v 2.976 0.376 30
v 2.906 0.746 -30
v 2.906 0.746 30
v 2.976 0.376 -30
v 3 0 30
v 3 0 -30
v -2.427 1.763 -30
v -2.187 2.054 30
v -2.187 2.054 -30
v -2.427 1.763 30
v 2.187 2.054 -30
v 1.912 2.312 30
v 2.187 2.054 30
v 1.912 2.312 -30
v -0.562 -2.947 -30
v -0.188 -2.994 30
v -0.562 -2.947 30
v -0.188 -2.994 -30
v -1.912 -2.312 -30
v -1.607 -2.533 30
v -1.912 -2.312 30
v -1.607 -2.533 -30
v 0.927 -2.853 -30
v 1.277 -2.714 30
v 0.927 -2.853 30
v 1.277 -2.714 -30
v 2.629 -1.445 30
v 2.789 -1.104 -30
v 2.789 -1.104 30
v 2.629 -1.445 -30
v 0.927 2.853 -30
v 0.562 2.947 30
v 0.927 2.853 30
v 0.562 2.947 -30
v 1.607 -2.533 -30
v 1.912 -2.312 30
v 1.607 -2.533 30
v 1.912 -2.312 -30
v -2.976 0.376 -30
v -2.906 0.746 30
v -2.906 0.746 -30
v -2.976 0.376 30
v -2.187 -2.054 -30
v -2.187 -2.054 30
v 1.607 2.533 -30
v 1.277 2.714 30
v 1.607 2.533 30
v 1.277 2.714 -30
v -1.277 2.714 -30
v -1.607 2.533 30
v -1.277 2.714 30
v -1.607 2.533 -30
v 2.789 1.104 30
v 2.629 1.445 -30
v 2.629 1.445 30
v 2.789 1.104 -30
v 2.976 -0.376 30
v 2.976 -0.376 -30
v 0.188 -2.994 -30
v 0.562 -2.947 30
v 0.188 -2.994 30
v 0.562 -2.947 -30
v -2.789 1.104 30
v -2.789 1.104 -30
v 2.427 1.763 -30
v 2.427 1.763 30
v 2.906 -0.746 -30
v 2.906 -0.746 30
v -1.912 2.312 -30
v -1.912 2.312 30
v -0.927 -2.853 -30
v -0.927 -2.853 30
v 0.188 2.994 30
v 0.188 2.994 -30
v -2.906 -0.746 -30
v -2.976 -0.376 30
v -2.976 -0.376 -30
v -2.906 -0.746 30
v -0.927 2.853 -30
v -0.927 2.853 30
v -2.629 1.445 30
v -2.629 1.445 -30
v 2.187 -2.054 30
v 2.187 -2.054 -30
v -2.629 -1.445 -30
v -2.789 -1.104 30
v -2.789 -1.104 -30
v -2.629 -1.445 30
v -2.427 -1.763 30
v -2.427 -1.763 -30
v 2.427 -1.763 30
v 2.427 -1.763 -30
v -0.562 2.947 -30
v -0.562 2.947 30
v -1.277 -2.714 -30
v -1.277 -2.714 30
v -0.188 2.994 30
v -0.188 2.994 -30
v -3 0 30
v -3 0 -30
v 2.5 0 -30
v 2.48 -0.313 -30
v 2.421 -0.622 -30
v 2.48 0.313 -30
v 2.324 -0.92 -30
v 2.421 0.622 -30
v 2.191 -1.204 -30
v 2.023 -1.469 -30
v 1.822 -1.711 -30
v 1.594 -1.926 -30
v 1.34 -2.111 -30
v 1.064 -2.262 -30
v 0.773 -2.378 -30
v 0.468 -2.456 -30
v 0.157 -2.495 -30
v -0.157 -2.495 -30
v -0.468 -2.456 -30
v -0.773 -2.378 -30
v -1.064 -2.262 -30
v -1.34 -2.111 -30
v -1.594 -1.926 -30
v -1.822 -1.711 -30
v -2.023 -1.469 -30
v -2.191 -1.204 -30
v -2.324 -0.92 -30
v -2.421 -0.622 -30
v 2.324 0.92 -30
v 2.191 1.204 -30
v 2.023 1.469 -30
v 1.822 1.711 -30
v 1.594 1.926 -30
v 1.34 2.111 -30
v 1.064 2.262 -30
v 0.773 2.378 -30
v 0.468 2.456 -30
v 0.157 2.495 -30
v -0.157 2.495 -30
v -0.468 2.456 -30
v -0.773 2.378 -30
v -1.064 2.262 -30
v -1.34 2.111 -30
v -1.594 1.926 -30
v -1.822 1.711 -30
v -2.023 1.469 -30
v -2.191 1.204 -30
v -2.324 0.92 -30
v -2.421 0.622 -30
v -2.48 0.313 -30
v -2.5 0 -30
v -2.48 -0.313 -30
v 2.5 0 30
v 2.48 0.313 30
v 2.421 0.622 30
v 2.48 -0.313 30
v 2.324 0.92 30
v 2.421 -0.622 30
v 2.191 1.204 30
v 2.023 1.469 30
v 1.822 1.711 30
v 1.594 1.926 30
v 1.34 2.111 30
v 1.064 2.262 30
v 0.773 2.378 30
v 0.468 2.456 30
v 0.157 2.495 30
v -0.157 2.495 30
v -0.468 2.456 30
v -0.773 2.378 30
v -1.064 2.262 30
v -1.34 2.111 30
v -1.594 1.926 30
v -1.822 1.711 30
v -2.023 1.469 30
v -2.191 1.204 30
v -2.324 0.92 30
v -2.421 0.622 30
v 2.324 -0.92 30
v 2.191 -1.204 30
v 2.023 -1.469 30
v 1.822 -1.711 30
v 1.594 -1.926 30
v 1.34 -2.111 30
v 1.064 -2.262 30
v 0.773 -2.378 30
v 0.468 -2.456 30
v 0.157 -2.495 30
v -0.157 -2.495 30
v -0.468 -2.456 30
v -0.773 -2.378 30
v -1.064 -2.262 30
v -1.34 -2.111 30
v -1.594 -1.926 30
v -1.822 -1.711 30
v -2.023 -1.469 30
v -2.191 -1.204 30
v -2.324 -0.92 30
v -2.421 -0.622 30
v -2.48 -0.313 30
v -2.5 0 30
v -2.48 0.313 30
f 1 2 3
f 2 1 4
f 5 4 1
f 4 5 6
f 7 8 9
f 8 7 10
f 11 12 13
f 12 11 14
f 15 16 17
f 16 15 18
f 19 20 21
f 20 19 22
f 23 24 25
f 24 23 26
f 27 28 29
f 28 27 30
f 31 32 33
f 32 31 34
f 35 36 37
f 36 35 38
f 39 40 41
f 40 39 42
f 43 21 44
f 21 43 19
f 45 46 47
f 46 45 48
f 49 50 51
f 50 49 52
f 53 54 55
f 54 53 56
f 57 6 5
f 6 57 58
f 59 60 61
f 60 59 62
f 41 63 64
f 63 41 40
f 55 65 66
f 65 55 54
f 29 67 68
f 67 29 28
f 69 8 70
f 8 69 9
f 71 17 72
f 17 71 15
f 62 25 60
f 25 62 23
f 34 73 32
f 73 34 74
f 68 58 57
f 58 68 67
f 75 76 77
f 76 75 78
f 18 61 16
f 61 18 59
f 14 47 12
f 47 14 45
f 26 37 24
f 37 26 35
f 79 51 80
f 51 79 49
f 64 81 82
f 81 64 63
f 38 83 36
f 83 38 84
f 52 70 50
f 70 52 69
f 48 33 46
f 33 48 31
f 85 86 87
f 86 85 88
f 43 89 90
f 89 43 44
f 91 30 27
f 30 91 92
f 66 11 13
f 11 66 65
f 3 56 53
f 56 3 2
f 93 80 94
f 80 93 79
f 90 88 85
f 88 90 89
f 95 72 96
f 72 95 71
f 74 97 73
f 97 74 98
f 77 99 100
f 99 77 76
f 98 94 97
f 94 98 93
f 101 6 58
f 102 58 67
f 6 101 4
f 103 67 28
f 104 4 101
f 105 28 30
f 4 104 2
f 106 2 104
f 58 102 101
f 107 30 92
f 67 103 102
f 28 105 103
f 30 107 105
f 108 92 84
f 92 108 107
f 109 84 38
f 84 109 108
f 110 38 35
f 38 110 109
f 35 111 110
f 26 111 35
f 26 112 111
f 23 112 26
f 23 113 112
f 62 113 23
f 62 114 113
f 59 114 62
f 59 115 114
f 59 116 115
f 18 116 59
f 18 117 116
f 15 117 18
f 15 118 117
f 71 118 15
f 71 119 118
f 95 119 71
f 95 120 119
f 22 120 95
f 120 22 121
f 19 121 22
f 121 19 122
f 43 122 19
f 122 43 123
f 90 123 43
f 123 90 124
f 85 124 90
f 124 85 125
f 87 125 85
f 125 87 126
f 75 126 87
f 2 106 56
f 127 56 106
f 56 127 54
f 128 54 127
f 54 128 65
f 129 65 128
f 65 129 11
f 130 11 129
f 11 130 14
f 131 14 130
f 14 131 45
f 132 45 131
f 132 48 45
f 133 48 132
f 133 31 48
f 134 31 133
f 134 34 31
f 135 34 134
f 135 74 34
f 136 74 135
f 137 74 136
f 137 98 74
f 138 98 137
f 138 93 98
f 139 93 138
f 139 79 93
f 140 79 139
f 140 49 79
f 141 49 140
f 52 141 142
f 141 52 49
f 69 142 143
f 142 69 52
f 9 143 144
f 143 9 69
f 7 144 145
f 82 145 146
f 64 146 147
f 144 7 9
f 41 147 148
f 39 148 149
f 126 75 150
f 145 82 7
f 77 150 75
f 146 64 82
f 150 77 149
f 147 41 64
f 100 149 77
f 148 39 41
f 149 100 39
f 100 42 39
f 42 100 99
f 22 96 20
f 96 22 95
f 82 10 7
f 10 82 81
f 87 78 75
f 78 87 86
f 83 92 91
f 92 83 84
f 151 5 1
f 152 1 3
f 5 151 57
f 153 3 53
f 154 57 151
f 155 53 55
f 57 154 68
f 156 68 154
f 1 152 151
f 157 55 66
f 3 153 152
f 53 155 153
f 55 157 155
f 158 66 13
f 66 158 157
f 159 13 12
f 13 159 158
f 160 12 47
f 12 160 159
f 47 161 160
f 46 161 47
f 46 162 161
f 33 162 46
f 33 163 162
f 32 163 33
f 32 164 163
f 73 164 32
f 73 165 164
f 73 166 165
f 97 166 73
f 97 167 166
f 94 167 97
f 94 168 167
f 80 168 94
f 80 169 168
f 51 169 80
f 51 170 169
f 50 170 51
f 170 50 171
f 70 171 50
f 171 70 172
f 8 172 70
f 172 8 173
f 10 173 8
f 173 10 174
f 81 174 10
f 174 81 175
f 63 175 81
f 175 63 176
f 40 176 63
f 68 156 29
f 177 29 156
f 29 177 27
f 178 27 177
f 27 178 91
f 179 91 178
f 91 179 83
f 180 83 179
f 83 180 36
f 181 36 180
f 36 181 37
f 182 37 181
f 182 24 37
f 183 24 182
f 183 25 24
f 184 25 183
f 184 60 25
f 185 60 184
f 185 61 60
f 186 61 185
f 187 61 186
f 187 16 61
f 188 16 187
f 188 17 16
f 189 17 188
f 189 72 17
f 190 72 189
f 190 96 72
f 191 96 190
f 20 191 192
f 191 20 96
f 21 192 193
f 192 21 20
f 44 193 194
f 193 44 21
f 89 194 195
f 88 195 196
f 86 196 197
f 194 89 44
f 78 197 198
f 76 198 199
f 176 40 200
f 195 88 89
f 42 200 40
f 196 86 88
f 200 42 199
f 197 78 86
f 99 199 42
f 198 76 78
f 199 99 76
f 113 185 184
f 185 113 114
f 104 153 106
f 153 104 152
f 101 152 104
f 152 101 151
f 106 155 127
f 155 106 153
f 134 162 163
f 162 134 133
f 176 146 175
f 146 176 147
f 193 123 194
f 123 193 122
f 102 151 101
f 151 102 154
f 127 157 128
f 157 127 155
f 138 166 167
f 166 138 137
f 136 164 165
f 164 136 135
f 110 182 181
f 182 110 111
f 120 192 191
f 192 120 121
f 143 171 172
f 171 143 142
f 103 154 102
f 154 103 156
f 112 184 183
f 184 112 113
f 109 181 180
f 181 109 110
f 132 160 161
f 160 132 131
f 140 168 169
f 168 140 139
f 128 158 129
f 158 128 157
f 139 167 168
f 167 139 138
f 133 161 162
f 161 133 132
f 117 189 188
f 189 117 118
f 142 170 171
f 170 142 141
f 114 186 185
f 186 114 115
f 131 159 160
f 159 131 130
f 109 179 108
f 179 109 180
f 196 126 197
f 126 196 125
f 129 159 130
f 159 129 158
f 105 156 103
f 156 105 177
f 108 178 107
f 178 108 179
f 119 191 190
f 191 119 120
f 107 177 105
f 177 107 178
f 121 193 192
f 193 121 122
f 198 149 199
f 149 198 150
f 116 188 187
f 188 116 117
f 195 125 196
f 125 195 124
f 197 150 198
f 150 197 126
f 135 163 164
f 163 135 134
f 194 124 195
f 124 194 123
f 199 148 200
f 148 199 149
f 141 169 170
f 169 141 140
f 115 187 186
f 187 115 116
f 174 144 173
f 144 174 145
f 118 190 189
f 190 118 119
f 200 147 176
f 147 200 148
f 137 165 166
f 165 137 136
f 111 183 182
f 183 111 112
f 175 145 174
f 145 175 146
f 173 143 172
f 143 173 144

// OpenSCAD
$fn = 50;


difference() {
	union() {
		translate(v = [0, 0, -30.0000000000]) {
			cylinder(h = 60, r = 3.0000000000);
		}
	}
	union() {
		translate(v = [0, 0, -100.0000000000]) {
			cylinder(h = 200, r = 2.5000000000);
		}
	}
}
